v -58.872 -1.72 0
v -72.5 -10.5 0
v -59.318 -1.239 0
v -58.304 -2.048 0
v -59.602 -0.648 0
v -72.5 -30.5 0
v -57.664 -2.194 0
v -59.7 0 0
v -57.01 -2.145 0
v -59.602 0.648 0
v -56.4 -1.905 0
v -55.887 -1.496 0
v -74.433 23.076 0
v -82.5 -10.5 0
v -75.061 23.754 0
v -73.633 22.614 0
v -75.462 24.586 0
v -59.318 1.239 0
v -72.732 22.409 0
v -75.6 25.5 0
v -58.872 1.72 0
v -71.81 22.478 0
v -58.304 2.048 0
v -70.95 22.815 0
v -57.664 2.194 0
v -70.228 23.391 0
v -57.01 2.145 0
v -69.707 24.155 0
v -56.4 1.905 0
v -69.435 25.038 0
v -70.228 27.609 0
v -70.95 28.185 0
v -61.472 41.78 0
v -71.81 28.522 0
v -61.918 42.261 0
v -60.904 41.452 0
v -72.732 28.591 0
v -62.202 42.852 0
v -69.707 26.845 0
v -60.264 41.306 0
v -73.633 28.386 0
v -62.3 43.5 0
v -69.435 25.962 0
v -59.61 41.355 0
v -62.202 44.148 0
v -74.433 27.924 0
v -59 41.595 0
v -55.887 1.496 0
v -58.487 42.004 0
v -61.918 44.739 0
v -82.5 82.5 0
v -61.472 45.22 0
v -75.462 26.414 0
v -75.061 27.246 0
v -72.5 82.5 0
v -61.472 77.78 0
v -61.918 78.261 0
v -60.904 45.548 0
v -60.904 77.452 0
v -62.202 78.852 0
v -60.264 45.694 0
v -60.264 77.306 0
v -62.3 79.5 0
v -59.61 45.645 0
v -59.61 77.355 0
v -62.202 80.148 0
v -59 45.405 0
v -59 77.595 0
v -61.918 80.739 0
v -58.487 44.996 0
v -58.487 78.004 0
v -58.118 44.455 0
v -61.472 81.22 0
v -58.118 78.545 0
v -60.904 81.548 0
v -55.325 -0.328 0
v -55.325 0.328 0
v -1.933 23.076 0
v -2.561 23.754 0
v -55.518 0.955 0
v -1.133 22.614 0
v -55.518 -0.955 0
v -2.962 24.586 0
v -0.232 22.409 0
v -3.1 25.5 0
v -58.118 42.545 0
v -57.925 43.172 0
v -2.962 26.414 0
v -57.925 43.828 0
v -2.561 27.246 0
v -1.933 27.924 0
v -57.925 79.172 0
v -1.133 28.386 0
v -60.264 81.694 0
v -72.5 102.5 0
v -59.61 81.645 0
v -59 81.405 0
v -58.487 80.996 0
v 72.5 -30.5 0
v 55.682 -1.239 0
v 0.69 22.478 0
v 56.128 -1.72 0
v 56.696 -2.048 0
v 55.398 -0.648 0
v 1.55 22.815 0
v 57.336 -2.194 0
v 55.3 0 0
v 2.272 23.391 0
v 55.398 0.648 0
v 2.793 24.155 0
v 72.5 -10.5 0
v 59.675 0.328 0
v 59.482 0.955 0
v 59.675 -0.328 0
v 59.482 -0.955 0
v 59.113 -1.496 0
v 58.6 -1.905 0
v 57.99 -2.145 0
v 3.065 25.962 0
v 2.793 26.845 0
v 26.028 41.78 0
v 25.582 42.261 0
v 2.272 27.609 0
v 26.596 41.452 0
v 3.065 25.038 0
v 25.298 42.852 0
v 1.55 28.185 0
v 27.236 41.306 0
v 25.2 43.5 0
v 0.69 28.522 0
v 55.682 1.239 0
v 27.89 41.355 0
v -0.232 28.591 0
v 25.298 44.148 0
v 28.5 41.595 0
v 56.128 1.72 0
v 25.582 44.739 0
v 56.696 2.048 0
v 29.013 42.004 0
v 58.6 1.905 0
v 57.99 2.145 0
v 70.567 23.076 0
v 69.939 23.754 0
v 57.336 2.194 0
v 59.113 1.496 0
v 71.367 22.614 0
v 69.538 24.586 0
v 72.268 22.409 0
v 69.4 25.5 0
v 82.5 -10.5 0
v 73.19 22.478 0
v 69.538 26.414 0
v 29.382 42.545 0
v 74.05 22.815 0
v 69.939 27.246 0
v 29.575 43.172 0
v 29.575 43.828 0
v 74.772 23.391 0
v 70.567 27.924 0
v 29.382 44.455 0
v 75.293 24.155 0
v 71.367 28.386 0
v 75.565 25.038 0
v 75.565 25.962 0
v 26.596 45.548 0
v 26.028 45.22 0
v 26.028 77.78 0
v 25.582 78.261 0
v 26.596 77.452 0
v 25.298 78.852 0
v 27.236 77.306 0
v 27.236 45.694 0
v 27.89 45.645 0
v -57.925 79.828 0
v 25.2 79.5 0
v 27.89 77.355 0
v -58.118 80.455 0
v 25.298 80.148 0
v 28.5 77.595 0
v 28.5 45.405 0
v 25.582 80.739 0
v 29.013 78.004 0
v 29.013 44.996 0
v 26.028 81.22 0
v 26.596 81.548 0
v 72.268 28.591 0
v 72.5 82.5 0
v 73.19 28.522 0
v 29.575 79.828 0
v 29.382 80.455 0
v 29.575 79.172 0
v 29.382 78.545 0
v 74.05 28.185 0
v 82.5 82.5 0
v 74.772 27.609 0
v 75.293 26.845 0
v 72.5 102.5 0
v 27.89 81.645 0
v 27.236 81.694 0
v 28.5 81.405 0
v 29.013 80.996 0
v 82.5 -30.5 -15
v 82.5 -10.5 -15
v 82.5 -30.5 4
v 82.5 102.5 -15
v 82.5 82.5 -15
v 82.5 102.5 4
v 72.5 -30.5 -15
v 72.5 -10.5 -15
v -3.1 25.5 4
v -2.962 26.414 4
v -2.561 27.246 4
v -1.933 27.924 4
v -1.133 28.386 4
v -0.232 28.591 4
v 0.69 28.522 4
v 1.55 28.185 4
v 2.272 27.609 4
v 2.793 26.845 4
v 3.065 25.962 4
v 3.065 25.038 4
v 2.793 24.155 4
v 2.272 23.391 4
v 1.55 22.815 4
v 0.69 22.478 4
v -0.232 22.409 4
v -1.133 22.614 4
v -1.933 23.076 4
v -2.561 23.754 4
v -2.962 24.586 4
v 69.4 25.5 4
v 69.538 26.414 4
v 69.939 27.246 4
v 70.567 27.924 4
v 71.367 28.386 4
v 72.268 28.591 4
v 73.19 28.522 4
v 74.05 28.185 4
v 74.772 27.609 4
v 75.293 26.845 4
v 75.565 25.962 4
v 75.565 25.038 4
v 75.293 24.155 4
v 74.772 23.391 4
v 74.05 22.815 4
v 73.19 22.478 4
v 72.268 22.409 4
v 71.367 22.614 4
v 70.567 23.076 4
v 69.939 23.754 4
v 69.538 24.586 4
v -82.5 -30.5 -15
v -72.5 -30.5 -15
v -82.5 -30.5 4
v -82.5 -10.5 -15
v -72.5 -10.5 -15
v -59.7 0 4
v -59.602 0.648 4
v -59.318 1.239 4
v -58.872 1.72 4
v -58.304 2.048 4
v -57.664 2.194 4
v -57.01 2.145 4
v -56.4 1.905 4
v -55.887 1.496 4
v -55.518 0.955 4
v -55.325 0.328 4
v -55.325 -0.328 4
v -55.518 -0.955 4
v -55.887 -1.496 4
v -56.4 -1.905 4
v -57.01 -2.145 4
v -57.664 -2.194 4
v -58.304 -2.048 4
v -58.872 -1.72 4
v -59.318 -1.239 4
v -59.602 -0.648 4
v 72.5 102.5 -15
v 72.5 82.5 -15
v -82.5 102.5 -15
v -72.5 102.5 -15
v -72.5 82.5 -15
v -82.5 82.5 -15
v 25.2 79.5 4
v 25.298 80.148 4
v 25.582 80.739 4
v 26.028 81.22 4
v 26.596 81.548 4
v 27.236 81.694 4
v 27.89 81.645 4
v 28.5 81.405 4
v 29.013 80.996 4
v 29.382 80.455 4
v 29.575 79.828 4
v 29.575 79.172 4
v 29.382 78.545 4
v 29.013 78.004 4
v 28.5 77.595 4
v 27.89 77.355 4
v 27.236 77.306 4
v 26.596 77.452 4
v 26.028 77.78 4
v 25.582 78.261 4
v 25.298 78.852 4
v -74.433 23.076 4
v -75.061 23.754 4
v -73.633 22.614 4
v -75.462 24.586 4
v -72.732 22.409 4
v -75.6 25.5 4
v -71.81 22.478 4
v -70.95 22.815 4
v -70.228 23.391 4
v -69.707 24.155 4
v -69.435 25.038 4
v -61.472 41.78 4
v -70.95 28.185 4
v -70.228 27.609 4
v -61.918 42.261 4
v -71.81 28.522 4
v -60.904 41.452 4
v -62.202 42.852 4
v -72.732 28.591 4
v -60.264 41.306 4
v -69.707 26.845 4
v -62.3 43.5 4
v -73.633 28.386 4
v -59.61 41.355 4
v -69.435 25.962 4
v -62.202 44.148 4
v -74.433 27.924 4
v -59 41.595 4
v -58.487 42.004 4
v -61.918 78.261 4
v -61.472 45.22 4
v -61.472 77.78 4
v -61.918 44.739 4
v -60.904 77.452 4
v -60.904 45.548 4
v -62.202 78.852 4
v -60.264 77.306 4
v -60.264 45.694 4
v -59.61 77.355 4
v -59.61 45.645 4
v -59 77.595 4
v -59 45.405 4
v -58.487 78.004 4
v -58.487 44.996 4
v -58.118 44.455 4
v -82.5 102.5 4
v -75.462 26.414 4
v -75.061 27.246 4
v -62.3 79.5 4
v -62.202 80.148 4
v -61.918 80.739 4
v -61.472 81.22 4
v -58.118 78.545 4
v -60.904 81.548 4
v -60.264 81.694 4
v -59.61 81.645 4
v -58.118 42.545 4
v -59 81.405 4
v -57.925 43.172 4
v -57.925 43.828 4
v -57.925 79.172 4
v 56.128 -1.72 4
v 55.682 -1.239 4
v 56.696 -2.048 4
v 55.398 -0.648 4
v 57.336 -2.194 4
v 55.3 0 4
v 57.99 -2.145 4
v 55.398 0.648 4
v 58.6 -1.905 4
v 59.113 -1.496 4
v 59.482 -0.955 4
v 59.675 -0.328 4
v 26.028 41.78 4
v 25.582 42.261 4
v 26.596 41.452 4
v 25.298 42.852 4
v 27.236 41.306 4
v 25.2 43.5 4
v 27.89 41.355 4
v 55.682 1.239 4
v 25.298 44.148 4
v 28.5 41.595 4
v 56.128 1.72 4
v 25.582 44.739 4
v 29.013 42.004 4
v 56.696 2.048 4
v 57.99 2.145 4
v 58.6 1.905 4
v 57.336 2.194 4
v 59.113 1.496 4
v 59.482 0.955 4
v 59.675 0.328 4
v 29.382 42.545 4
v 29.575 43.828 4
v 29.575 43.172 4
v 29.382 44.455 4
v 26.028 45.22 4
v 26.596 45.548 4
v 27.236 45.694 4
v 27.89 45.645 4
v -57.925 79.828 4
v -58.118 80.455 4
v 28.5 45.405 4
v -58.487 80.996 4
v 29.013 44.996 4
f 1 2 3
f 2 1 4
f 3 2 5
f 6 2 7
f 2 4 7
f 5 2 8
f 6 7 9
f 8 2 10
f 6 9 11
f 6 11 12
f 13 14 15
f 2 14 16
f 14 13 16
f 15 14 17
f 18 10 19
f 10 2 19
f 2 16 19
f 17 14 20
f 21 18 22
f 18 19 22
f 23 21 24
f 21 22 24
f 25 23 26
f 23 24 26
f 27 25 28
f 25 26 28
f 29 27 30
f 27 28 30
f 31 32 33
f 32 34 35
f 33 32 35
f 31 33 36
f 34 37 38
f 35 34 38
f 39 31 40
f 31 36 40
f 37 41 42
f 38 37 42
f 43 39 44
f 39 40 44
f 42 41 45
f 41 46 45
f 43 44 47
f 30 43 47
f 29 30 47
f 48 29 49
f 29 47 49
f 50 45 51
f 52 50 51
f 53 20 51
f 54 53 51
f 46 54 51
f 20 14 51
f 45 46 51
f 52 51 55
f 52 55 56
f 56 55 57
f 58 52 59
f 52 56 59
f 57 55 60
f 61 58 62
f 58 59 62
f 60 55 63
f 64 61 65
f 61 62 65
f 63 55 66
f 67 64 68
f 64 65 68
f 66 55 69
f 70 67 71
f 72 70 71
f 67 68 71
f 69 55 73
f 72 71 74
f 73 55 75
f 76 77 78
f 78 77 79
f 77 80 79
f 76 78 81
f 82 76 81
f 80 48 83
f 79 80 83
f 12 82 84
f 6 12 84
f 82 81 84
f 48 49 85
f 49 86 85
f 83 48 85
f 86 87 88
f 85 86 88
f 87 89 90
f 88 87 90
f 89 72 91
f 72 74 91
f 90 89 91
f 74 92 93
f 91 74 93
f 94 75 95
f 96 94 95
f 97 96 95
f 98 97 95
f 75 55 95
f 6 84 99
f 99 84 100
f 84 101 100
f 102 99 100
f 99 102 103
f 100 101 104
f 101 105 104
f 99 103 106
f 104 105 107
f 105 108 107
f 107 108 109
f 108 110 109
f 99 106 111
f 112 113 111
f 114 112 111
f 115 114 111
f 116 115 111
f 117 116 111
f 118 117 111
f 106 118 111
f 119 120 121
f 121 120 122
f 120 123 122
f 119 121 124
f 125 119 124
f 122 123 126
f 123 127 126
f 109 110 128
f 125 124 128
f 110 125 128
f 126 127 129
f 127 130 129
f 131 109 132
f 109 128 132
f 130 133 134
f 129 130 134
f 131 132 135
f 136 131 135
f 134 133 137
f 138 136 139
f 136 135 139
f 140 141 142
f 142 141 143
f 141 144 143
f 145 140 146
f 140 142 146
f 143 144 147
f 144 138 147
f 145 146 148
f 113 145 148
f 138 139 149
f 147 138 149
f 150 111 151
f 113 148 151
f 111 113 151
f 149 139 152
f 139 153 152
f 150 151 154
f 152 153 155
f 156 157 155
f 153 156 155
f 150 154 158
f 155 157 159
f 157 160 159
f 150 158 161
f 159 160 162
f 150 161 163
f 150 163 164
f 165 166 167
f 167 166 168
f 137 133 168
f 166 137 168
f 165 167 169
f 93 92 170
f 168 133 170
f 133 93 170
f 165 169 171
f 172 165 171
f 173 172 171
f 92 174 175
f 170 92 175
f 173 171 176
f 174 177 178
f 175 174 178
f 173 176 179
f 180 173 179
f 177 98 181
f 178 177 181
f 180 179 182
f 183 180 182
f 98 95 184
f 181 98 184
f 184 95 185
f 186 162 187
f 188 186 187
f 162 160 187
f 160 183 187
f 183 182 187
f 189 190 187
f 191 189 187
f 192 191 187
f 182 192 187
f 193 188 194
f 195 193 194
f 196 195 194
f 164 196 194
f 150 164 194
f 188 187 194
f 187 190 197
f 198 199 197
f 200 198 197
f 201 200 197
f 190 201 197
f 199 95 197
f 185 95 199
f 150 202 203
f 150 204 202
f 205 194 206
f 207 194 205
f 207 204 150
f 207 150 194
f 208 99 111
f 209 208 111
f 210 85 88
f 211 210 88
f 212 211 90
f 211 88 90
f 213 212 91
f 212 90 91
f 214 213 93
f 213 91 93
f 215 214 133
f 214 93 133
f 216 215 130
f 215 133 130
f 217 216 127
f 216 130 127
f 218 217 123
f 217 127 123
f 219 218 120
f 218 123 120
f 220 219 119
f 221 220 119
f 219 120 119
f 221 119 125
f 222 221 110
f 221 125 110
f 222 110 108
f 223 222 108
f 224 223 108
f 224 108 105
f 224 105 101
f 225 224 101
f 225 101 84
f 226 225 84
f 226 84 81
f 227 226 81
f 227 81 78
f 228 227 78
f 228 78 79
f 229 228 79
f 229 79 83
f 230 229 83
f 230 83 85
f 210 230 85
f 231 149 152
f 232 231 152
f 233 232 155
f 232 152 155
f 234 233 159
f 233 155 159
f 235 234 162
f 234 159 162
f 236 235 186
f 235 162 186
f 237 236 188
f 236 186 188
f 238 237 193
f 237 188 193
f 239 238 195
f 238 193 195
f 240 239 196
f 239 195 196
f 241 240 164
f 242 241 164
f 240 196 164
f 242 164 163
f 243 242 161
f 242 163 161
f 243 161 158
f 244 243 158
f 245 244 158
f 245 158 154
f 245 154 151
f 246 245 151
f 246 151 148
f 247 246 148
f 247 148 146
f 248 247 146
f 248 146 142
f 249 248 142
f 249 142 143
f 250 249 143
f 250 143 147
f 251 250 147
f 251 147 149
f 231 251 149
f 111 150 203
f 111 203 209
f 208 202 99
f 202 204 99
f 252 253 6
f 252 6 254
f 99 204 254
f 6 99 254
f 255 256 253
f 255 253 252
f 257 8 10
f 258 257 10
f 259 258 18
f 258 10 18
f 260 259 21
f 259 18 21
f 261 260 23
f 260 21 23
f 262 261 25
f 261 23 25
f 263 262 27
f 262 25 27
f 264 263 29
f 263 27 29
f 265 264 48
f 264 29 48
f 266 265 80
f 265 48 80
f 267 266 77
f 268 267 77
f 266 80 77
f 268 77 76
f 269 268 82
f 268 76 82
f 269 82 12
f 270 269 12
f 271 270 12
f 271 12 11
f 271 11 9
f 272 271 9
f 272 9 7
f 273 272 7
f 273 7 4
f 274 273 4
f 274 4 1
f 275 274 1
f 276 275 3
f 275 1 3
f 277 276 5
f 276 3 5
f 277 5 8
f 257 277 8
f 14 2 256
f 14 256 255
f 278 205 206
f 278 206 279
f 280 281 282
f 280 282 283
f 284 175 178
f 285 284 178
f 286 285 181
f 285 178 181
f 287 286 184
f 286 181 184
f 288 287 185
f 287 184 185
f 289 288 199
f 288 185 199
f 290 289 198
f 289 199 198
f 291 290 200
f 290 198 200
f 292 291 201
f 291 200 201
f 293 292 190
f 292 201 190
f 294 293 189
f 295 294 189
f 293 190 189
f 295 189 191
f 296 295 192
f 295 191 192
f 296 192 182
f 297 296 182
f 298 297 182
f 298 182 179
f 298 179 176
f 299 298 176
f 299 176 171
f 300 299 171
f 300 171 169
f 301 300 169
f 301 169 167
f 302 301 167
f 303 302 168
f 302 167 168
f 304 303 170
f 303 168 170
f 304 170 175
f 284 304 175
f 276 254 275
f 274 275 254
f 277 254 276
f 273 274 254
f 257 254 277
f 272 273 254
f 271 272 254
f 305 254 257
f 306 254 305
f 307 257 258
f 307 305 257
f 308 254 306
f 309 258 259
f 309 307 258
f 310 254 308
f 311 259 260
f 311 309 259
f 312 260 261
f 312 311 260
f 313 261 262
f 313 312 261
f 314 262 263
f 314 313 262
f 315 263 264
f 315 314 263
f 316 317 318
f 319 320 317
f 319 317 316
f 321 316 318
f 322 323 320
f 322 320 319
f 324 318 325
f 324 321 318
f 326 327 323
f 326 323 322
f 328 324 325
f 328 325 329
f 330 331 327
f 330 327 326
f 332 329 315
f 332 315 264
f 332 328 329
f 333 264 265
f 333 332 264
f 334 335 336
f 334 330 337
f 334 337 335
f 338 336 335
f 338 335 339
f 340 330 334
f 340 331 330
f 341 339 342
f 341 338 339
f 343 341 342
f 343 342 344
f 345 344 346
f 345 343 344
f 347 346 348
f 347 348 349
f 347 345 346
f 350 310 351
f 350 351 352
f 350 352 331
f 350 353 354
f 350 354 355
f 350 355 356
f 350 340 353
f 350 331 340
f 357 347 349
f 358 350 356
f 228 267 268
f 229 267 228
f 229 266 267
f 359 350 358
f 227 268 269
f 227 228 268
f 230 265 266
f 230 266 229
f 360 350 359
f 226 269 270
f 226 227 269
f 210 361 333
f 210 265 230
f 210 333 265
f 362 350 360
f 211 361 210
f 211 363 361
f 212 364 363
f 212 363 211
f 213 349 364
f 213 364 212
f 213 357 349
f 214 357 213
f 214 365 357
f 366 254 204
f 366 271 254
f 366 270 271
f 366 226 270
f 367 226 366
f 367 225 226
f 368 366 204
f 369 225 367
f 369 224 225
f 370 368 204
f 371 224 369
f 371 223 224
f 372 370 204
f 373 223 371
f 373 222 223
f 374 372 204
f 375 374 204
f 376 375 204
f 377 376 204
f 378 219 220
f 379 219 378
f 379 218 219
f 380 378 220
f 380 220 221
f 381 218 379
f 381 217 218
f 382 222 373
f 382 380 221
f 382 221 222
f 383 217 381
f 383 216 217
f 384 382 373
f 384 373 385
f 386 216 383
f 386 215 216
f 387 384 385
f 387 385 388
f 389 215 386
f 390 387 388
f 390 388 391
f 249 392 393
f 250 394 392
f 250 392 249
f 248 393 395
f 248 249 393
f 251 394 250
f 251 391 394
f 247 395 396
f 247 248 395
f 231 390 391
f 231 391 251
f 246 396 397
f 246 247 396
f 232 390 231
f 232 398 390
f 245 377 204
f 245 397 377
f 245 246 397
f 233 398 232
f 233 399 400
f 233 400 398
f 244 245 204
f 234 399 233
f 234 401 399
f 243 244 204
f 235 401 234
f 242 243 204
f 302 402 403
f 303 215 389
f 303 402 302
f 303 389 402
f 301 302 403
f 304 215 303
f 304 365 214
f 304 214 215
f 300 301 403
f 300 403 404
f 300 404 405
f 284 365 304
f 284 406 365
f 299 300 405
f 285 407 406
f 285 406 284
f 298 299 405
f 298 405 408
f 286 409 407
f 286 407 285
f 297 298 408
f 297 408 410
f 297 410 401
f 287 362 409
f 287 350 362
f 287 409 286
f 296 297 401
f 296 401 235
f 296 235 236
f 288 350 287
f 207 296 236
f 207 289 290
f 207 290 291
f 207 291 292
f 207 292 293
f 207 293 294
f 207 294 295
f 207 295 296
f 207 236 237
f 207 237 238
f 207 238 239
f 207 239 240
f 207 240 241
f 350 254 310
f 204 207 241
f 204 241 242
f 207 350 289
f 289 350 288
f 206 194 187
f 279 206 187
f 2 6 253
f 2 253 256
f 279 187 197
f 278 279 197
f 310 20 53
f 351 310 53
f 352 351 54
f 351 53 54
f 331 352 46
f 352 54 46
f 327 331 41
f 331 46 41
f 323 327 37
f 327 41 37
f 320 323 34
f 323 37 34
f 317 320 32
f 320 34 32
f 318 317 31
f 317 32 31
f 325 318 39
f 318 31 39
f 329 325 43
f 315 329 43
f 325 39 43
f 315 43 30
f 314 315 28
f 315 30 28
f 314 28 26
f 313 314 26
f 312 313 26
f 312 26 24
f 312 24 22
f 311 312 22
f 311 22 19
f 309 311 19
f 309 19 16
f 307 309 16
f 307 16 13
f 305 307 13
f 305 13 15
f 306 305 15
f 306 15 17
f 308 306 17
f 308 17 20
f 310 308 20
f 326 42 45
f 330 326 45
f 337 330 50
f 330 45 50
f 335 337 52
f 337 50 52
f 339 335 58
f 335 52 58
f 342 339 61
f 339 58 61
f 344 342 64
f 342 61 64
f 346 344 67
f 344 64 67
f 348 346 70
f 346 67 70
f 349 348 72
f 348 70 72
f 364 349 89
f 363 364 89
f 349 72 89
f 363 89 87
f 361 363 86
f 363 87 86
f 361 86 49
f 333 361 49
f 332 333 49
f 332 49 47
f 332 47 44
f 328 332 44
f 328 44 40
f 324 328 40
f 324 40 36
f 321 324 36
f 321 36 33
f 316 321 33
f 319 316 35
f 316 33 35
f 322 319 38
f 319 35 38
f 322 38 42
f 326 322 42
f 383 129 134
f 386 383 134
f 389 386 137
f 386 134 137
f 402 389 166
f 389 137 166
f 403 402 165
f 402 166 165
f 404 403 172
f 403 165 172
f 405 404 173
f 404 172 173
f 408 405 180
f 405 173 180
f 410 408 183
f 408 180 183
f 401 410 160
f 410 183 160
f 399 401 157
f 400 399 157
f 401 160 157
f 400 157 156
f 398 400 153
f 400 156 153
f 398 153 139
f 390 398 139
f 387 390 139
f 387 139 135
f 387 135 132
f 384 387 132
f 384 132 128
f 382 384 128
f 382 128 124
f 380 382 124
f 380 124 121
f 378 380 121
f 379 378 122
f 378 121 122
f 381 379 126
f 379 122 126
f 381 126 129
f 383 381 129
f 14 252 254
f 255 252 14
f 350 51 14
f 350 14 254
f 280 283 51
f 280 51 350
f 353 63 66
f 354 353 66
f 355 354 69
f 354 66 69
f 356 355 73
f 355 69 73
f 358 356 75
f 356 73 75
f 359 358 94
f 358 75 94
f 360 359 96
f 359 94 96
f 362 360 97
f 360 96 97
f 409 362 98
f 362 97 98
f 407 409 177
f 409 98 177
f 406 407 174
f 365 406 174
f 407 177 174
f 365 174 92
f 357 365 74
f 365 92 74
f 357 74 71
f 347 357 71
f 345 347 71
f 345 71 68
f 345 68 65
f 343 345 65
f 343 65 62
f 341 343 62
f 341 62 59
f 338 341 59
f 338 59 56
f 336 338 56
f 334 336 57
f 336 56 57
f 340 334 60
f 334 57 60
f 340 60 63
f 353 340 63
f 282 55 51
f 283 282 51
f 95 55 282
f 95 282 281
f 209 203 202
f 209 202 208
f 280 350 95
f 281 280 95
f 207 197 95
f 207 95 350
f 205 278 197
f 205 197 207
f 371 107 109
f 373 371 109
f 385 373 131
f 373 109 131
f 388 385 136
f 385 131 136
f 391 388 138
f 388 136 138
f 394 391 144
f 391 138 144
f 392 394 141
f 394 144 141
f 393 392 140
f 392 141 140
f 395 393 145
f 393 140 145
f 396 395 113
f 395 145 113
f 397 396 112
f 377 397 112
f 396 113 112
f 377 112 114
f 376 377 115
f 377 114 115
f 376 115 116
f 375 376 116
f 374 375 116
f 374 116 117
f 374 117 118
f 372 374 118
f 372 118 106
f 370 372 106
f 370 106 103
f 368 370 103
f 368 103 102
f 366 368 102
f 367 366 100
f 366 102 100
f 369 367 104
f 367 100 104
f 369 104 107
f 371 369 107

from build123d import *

# Parameters (mm, degrees)
SKETCH1_W           = 165
SKETCH1_H           = 133
BOSS_EXTRUDE1_DEPTH = 4
SKETCH2_R           = 2.2
CUT_EXTRUDE1_DEPTH  = 4
SKETCH3_W           = 10
SKETCH3_H           = 20
BOSS_EXTRUDE2_DEPTH = 15
CUT_EXTRUDE2_REACH  = 134.429
SKETCH4_R           = 3.1


with BuildPart() as part:
    # Sketch1 → Boss-Extrude1 (new body)
    with BuildSketch(Plane.XY):
        with Locations((0, 36)):
            Rectangle(SKETCH1_W, SKETCH1_H)
    extrude(amount=BOSS_EXTRUDE1_DEPTH)

    # Sketch2 → Cut-Extrude1 (cut)
    with BuildSketch(Plane(origin=(0, 0, 0), x_dir=(-1, 0, 0), z_dir=(0, 0, -1))):
        with Locations((-27.4, 43.5)):
            Circle(SKETCH2_R)
        with Locations((60.1, 43.5)):
            Circle(SKETCH2_R)
        with Locations((60.1, 79.5)):
            Circle(SKETCH2_R)
        with Locations((-27.4, 79.5)):
            Circle(SKETCH2_R)
        with Locations((57.5, 0)):
            Circle(SKETCH2_R)
        with Locations((-57.5, 0)):
            Circle(SKETCH2_R)
    extrude(amount=-CUT_EXTRUDE1_DEPTH, mode=Mode.SUBTRACT)

    # Sketch3 → Boss-Extrude2 (add)
    with BuildSketch(Plane(origin=(0, 0, 0), x_dir=(-1, 0, 0), z_dir=(0, 0, -1))):
        with Locations((-77.5, -20.5)):
            Rectangle(SKETCH3_W, SKETCH3_H)
        with Locations((-77.5, 92.5)):
            Rectangle(SKETCH3_W, SKETCH3_H)
        with Locations((77.5, -20.5)):
            Rectangle(SKETCH3_W, SKETCH3_H)
        with Locations((77.5, 92.5)):
            Rectangle(SKETCH3_W, SKETCH3_H)
    extrude(amount=BOSS_EXTRUDE2_DEPTH)

    # Sketch4 → Cut-Extrude2 (cut, up to next)
    with BuildSketch(Plane(origin=(0, 0, 0), x_dir=(-1, 0, 0), z_dir=(0, 0, -1)), mode=Mode.PRIVATE) as cut_extrude2_sk1:
        with Locations((-72.5, 25.5)):
            Circle(SKETCH4_R)
    cut_extrude2_tool1 = extrude(cut_extrude2_sk1.sketch, amount=-CUT_EXTRUDE2_REACH, mode=Mode.PRIVATE) & part.part
    # Sketch4 → Cut-Extrude2 (cut, up to next)
    with BuildSketch(Plane(origin=(0, 0, 0), x_dir=(-1, 0, 0), z_dir=(0, 0, -1)), mode=Mode.PRIVATE) as cut_extrude2_sk2:
        with Locations((72.5, 25.5)):
            Circle(SKETCH4_R)
    cut_extrude2_tool2 = extrude(cut_extrude2_sk2.sketch, amount=-CUT_EXTRUDE2_REACH, mode=Mode.PRIVATE) & part.part
    # Sketch4 → Cut-Extrude2 (cut, up to next)
    with BuildSketch(Plane(origin=(0, 0, 0), x_dir=(-1, 0, 0), z_dir=(0, 0, -1)), mode=Mode.PRIVATE) as cut_extrude2_sk3:
        with Locations((0, 25.5)):
            Circle(SKETCH4_R)
    cut_extrude2_tool3 = extrude(cut_extrude2_sk3.sketch, amount=-CUT_EXTRUDE2_REACH, mode=Mode.PRIVATE) & part.part
    add(cut_extrude2_tool1.solids().sort_by_distance((72.5, 25.5, 0))[0], mode=Mode.SUBTRACT)
    add(cut_extrude2_tool2.solids().sort_by_distance((-72.5, 25.5, 0))[0], mode=Mode.SUBTRACT)
    add(cut_extrude2_tool3.solids().sort_by_distance((0, 25.5, 0))[0], mode=Mode.SUBTRACT)


solid = part.part
